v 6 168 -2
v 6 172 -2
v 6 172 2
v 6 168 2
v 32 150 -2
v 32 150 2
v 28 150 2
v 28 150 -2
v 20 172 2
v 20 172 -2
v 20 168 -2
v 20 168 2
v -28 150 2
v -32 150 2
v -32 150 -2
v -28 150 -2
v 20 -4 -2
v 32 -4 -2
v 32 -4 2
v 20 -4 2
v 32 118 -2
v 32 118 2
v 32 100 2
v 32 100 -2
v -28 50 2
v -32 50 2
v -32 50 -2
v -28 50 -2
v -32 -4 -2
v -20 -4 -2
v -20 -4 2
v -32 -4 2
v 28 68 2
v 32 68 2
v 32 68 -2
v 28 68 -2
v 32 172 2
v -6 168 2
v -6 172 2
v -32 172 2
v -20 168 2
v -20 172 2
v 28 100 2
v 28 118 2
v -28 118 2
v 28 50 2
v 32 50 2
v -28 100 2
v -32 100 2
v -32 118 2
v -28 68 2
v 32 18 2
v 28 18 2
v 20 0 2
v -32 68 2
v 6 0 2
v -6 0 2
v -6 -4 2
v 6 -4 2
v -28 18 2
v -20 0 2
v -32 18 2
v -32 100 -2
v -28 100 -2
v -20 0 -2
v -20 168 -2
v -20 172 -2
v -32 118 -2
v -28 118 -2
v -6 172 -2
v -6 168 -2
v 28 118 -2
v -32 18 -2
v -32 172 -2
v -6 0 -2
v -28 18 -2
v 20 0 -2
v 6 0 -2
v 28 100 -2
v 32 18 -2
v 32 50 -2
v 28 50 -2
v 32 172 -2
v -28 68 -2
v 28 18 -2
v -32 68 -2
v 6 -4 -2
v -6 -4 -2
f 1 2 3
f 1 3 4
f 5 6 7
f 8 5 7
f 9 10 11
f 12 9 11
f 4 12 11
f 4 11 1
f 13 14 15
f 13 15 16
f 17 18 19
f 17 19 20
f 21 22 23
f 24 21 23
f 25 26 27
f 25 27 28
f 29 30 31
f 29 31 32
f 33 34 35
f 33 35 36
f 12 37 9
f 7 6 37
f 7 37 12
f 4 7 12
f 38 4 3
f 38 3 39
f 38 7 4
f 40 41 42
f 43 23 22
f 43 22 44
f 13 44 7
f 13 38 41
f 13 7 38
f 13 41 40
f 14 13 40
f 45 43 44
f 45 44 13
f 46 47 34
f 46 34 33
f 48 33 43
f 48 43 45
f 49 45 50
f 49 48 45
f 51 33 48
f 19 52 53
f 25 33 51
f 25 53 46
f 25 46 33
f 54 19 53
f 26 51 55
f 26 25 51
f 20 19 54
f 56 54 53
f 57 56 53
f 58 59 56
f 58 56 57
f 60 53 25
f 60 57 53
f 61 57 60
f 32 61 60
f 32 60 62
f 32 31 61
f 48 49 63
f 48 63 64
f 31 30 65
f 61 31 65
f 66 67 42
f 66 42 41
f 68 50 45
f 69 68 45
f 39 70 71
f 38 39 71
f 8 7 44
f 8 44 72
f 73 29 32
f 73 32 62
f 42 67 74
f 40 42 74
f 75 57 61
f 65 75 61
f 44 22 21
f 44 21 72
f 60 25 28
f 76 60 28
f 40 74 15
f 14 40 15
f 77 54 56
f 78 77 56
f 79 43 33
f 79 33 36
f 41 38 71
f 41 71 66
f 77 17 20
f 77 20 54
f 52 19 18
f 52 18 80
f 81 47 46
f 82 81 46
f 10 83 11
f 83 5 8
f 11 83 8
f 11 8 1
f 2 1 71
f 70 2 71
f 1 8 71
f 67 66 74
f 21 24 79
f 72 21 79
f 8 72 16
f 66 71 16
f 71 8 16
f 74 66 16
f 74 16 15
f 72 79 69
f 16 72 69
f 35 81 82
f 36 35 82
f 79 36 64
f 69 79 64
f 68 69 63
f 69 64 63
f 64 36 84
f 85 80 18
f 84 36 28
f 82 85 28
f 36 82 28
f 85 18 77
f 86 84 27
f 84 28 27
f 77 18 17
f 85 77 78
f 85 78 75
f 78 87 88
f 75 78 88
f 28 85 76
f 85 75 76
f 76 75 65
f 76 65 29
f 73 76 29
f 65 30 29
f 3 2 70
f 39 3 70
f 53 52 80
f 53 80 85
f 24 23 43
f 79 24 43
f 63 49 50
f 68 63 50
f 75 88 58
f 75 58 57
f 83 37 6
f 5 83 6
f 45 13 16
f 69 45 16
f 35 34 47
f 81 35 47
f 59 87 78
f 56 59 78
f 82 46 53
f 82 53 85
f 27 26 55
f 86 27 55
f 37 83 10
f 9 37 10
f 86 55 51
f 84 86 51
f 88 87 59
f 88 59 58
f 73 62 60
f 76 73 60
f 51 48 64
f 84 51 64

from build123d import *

# Parameters (mm, degrees)
SKETCH1_W               = 56
SKETCH1_H               = 4
BOSS_EXTRUDE1_DEPTH     = 168
SKETCH2_W               = 4
SKETCH2_H               = 18
BOSS_EXTRUDE3_DEPTH     = 4
LPATTERN1_COUNT         = 4
LPATTERN1_PITCH         = 50
MIRROR1_COPY_1_SKETCH_W = 4
MIRROR1_COPY_1_SKETCH_H = 18
MIRROR1_COPY_1_DEPTH    = 4
MIRROR1_COPY_2_SKETCH_W = 4
MIRROR1_COPY_2_SKETCH_H = 18
MIRROR1_COPY_2_DEPTH    = 4
MIRROR1_COPY_3_SKETCH_W = 4
MIRROR1_COPY_3_SKETCH_H = 18
MIRROR1_COPY_3_DEPTH    = 4
SKETCH3_W               = 12
SKETCH3_H               = 4
BOSS_EXTRUDE4_DEPTH     = 4


with BuildPart() as part:
    # Sketch1 → Boss-Extrude1 (new body)
    with BuildSketch(Plane(origin=(0, 0, 0), x_dir=(1, 0, 0), z_dir=(0, 1, 0))):
        Rectangle(SKETCH1_W, SKETCH1_H)
    extrude(amount=BOSS_EXTRUDE1_DEPTH)

    # Sketch2 → Boss-Extrude3 (add, through all)
    with BuildSketch(Plane.XY.offset(2)):
        with Locations((-30, 9)):
            Rectangle(SKETCH2_W, SKETCH2_H)
    boss_extrude3 = extrude(amount=-BOSS_EXTRUDE3_DEPTH)

    # LPattern1: Boss-Extrude3 ×4
    with Locations(*[(0, i * LPATTERN1_PITCH, 0) for i in range(1, LPATTERN1_COUNT)]):
        add(boss_extrude3)

    # Mirror1: Boss-Extrude3 across plane
    add(boss_extrude3.mirror(Plane(origin=(0, 0, 0), x_dir=(0, 0, 1), z_dir=(1, 0, 0))))

    # Mirror1 copy 1 sketch → Mirror1 copy 1 (add, through all)
    with BuildSketch(Plane(origin=(0, 50, 2), x_dir=(-1, 0, 0), z_dir=(0, 0, 1))):
        with Locations((-30, -9)):
            Rectangle(MIRROR1_COPY_1_SKETCH_W, MIRROR1_COPY_1_SKETCH_H)
    extrude(amount=-MIRROR1_COPY_1_DEPTH)

    # Mirror1 copy 2 sketch → Mirror1 copy 2 (add, through all)
    with BuildSketch(Plane(origin=(0, 100, 2), x_dir=(-1, 0, 0), z_dir=(0, 0, 1))):
        with Locations((-30, -9)):
            Rectangle(MIRROR1_COPY_2_SKETCH_W, MIRROR1_COPY_2_SKETCH_H)
    extrude(amount=-MIRROR1_COPY_2_DEPTH)

    # Mirror1 copy 3 sketch → Mirror1 copy 3 (add, through all)
    with BuildSketch(Plane(origin=(0, 150, 2), x_dir=(-1, 0, 0), z_dir=(0, 0, 1))):
        with Locations((-30, -9)):
            Rectangle(MIRROR1_COPY_3_SKETCH_W, MIRROR1_COPY_3_SKETCH_H)
    extrude(amount=-MIRROR1_COPY_3_DEPTH)

    # Sketch3 → Boss-Extrude4 (add, through all)
    with BuildSketch(Plane(origin=(0, 0, -2), x_dir=(-1, 0, 0), z_dir=(0, 0, -1))):
        with Locations((26, -2)):
            Rectangle(SKETCH3_W, SKETCH3_H)
        with Locations((0, -2)):
            Rectangle(SKETCH3_W, SKETCH3_H)
        with Locations((-26, -2)):
            Rectangle(SKETCH3_W, SKETCH3_H)
    boss_extrude4 = extrude(amount=-BOSS_EXTRUDE4_DEPTH)

    # Mirror2: Boss-Extrude4 across plane
    add(boss_extrude4.mirror(Plane(origin=(0, 84, 0), x_dir=(0, 0, 1), z_dir=(0, -1, 0))))


solid = part.part
